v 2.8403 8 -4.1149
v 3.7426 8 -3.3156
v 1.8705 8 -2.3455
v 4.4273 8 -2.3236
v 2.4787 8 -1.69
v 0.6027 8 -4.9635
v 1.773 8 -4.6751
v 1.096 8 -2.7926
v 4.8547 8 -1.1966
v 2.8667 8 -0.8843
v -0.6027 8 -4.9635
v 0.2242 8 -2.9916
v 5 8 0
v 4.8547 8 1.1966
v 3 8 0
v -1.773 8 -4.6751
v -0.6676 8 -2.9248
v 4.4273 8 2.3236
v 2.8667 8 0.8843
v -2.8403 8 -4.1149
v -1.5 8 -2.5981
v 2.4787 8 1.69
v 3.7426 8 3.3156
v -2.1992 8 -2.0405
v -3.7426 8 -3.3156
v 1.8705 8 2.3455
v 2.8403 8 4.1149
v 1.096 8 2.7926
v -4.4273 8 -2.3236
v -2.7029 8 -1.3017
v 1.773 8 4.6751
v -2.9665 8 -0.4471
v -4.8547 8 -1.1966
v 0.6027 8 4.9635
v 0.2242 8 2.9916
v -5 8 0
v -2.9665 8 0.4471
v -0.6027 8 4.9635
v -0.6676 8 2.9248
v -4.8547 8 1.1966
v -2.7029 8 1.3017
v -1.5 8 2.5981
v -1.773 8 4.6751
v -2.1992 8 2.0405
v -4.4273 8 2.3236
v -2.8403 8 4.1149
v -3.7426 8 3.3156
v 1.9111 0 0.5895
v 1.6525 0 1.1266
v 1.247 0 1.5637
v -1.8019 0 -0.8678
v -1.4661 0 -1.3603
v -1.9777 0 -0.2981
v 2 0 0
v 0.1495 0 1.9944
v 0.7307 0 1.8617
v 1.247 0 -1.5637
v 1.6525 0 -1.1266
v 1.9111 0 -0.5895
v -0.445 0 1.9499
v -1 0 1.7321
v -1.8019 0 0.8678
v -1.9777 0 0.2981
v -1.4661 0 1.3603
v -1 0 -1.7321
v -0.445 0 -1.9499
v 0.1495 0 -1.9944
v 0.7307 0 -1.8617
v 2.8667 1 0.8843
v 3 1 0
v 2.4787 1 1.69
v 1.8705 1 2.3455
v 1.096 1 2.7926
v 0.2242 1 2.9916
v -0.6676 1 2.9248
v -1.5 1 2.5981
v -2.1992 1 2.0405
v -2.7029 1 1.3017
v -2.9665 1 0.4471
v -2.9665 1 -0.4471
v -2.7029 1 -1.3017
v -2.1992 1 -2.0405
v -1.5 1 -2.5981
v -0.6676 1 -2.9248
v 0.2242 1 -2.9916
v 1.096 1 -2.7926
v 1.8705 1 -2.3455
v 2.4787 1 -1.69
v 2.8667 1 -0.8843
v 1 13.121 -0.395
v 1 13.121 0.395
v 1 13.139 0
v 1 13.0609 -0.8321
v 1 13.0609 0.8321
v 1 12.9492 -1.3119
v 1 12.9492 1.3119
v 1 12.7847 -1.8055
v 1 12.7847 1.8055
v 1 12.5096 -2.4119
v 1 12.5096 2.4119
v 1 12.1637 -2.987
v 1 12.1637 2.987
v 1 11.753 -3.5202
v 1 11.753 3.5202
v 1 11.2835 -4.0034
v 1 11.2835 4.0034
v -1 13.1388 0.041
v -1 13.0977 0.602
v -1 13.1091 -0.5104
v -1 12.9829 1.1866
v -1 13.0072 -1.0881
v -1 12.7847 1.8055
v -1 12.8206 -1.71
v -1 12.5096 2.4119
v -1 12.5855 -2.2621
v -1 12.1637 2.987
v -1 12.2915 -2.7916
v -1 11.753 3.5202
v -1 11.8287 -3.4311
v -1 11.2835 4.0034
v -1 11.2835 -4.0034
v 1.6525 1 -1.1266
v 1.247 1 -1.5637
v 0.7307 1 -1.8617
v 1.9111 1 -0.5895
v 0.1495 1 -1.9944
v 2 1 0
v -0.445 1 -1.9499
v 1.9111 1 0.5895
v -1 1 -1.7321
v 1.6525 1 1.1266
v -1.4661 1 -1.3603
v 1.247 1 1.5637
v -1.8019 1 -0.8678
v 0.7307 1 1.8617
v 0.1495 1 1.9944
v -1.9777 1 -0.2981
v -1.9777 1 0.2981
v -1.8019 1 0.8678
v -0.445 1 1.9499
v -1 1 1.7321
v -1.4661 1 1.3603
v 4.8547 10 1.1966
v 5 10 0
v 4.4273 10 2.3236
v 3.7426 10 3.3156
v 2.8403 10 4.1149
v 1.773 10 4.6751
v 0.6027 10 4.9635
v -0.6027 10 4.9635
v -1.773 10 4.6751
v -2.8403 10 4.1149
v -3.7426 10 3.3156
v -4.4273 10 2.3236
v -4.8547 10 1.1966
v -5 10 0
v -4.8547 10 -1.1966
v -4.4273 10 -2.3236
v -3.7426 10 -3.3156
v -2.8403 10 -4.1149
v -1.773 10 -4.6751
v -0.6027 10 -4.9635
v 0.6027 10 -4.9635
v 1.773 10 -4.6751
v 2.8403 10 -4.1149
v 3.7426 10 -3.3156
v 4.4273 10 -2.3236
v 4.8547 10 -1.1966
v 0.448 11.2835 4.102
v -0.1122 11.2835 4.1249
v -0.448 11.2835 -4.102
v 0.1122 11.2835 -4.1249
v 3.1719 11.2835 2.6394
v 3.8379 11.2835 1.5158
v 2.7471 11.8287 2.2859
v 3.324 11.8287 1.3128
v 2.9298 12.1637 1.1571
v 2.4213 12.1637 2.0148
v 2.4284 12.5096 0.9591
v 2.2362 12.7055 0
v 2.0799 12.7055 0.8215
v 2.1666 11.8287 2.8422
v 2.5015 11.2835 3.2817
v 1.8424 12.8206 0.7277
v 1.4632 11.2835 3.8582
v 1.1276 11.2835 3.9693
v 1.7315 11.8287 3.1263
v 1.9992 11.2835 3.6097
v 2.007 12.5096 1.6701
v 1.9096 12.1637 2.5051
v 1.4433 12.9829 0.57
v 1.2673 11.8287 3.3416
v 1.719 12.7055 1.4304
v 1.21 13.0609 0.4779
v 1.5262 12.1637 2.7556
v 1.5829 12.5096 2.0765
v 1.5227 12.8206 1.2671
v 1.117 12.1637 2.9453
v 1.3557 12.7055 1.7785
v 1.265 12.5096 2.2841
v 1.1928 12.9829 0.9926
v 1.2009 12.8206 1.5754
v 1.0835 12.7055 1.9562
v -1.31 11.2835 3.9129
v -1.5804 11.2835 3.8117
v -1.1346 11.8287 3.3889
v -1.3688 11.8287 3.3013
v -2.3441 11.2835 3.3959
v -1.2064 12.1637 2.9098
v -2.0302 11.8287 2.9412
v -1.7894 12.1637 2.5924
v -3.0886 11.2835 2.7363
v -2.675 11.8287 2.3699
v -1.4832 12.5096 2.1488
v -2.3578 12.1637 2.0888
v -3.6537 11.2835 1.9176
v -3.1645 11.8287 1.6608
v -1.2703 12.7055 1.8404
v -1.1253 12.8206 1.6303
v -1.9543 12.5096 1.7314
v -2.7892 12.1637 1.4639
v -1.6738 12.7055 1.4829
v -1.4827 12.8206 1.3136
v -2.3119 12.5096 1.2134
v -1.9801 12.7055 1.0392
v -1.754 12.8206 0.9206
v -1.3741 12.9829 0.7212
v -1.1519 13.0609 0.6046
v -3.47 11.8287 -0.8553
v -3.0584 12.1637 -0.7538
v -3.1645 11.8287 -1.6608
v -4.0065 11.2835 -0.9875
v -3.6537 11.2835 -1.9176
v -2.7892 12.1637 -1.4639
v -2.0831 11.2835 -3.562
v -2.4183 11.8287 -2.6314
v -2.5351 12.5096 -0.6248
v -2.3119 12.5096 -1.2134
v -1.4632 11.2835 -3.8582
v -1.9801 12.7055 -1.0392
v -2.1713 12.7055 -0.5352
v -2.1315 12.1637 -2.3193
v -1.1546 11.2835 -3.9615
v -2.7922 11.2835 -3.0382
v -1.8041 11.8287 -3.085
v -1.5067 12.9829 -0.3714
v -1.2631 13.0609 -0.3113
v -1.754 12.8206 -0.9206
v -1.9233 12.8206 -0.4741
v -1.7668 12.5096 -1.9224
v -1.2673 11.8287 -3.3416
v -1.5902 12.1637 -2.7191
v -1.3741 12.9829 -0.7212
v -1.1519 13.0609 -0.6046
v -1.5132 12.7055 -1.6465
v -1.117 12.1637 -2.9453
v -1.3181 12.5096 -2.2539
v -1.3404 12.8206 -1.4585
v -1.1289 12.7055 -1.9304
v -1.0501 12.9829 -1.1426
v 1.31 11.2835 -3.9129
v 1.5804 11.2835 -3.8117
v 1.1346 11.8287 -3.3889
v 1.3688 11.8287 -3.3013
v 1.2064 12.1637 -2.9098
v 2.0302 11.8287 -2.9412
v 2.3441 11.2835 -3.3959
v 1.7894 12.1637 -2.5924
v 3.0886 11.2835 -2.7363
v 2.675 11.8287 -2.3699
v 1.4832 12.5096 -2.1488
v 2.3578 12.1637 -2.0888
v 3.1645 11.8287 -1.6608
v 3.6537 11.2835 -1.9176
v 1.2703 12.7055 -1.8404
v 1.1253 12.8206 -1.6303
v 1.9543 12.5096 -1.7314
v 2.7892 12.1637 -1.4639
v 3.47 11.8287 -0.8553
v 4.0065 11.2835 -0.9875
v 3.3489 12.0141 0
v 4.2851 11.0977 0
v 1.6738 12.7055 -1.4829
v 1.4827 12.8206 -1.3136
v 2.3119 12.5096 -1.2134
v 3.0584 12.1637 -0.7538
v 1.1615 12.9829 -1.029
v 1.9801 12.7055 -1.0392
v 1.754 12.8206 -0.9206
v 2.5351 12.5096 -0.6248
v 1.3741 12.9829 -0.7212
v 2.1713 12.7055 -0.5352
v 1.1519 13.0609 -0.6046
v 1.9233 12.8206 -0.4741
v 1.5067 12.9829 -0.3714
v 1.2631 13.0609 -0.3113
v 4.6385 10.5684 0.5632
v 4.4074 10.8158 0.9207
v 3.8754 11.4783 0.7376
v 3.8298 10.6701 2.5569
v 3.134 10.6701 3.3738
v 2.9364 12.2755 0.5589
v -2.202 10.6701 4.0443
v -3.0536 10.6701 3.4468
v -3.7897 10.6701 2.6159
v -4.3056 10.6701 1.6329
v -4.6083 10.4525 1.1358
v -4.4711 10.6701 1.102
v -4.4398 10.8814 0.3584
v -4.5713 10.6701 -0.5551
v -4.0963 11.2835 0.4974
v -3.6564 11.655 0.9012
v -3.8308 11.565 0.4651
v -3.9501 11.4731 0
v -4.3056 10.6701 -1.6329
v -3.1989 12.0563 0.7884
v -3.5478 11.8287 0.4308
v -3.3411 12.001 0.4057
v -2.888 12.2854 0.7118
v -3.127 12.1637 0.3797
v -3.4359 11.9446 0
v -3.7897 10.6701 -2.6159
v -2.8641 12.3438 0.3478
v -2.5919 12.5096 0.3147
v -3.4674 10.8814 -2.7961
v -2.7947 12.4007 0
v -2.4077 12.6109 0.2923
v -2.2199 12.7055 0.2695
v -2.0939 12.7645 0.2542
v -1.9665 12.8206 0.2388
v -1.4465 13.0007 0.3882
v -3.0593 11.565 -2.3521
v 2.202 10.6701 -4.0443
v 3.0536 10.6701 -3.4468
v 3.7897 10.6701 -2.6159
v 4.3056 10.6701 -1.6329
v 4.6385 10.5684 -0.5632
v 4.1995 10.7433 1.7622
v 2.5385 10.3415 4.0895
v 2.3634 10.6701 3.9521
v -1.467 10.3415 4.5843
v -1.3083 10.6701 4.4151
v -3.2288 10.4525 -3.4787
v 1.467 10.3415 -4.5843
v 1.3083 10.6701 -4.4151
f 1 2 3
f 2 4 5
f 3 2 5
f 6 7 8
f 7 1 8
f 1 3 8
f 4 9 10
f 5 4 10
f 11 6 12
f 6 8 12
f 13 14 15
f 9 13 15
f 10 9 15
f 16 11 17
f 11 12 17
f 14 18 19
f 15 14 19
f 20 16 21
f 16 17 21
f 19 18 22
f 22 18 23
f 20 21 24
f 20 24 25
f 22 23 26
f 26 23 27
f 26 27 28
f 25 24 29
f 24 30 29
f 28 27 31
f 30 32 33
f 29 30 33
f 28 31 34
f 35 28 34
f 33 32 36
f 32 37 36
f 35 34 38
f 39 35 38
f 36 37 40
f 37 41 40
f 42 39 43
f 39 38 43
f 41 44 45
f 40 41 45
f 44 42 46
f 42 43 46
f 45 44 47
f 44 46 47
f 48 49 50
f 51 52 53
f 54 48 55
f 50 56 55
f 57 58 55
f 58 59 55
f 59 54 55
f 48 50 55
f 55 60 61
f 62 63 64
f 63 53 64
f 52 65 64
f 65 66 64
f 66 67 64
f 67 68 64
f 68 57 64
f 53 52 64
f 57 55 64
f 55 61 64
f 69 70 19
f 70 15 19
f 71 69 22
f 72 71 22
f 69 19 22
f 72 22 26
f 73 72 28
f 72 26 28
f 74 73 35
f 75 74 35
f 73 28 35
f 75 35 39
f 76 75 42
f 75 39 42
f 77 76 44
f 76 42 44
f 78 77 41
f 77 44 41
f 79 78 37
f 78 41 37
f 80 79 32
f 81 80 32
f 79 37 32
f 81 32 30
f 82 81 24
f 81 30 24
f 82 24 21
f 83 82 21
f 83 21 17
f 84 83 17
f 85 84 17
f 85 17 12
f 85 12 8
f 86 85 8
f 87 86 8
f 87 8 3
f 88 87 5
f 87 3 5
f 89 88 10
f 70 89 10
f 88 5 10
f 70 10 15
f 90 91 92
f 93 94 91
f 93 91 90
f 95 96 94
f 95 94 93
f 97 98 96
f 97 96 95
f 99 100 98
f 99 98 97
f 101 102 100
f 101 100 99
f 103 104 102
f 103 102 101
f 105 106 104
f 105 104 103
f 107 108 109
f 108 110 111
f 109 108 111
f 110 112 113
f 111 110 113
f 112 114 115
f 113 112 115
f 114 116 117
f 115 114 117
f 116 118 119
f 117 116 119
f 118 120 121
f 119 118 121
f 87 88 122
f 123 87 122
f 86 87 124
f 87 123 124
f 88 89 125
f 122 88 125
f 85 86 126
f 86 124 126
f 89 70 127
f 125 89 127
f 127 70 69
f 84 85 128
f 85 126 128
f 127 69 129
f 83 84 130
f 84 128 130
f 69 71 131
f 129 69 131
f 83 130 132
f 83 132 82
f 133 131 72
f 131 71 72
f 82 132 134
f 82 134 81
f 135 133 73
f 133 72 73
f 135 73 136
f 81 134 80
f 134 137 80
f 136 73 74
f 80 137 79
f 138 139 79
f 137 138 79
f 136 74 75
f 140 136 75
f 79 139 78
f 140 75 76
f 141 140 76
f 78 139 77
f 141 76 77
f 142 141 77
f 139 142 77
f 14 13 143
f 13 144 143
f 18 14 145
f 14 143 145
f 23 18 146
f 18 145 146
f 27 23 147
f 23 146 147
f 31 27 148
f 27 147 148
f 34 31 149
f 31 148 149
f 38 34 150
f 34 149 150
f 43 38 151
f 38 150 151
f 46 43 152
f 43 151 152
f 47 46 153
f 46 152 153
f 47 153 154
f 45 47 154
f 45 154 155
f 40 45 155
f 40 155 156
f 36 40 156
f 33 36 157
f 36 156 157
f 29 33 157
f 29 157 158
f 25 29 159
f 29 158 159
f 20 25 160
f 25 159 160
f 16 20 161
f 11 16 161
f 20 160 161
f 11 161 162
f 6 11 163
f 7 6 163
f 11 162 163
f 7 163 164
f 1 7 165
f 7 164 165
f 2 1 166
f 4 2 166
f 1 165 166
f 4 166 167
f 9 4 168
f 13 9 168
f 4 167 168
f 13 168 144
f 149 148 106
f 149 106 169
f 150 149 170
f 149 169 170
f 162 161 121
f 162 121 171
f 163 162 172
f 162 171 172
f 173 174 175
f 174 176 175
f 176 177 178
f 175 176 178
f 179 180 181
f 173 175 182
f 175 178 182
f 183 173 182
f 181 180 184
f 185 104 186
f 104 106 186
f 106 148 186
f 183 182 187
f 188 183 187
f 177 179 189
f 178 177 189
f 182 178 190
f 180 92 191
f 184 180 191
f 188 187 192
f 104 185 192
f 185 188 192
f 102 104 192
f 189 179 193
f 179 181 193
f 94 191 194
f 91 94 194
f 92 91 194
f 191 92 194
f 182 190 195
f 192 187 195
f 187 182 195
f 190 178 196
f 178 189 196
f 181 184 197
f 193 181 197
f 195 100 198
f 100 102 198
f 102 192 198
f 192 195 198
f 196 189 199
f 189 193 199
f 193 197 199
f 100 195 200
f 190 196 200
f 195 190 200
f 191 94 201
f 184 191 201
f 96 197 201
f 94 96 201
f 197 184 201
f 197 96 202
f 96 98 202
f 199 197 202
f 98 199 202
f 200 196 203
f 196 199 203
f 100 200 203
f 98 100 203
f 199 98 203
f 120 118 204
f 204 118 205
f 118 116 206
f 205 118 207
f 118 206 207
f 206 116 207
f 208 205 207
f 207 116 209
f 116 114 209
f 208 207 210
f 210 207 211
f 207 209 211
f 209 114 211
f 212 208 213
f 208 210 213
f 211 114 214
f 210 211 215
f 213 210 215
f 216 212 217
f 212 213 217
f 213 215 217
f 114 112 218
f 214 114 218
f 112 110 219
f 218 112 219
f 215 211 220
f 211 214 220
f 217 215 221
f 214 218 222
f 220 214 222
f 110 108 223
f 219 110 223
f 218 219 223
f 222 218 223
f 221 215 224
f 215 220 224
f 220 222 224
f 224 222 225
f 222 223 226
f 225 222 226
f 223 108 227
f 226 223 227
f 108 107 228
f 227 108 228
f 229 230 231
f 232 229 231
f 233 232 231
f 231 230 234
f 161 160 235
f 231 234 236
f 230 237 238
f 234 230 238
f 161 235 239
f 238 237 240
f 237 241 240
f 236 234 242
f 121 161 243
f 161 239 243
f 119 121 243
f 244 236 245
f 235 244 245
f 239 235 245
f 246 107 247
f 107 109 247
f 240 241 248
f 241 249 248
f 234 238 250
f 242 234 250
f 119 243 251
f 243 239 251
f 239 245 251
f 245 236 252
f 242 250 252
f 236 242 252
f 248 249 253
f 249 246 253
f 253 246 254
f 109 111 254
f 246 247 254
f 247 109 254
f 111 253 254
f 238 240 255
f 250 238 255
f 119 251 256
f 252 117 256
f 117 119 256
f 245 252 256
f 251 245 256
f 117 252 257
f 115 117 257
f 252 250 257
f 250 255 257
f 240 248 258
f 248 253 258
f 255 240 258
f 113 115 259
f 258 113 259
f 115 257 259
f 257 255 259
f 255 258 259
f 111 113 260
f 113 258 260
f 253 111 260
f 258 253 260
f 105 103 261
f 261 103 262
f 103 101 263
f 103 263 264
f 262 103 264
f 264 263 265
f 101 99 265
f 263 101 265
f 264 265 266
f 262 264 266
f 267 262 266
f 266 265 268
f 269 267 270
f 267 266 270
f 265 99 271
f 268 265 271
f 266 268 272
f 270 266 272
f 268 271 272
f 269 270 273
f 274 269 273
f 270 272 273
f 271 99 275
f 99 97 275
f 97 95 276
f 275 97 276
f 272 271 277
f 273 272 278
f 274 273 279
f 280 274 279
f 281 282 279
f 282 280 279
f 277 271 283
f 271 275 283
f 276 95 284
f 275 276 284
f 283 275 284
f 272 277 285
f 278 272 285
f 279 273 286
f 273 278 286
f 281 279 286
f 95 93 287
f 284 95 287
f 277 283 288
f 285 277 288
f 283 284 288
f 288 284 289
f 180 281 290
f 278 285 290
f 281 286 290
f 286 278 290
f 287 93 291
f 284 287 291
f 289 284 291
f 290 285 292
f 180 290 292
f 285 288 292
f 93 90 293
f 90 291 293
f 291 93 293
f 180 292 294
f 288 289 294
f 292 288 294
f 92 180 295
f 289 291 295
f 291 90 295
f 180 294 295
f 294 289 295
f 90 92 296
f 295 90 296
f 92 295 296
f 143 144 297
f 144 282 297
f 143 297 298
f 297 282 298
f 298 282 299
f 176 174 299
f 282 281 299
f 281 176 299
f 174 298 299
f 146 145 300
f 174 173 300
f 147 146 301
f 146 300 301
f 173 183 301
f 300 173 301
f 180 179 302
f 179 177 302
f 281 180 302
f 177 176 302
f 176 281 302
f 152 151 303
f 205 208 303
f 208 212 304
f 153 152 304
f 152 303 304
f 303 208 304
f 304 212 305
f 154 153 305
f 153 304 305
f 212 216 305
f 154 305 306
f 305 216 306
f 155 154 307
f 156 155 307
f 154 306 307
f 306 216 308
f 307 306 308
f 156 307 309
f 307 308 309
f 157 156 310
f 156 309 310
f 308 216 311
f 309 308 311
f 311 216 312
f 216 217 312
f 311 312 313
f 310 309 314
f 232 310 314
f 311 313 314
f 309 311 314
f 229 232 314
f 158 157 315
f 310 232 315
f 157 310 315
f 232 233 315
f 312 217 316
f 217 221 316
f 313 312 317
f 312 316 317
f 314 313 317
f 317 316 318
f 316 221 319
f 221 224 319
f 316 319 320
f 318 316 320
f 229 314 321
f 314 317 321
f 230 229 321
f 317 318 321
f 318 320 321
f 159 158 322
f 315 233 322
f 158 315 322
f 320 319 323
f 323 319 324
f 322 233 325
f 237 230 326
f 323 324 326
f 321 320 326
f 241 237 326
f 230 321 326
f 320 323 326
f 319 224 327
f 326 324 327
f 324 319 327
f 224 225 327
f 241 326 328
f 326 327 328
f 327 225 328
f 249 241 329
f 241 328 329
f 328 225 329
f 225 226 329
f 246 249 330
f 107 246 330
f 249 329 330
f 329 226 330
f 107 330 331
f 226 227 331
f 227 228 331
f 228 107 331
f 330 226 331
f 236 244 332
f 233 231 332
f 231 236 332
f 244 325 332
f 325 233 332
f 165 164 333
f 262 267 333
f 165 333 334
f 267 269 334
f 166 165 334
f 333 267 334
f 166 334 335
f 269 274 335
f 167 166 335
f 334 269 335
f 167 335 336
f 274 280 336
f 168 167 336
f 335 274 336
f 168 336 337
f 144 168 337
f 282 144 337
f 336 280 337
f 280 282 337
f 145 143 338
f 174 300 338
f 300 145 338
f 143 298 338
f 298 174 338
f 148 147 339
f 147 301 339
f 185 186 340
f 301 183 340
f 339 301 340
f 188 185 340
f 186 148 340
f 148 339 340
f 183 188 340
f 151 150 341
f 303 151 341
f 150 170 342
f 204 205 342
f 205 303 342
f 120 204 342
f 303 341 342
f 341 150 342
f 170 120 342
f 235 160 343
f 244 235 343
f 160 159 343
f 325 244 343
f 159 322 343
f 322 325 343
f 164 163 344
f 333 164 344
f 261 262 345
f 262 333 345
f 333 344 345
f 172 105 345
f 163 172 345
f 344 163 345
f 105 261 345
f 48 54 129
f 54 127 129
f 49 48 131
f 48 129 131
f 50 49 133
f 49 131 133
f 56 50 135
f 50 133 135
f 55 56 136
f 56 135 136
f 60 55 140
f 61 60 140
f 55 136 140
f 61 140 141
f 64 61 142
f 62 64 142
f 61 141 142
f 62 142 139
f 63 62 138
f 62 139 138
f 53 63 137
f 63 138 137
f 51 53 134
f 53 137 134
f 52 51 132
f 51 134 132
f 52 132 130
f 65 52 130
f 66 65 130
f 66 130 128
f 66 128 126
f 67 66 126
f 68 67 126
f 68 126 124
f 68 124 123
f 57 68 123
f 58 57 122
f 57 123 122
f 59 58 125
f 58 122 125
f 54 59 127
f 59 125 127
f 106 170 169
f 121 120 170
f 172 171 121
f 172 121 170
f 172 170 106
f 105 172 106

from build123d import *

# Parameters (mm, degrees)
SKETCH2_W               = 2
SKETCH2_H               = 4
CUT_EXTRUDE1_DEPTH      = 6.0000001
CUT_EXTRUDE1_DEPTH_BACK = 6.0000001


with BuildPart() as part:
    # Sketch1 → Revolve1 (revolve)
    with BuildSketch(Plane.XY):
        with BuildLine():
            Line((0, 0), (2, 0))
            Line((2, 0), (2, 1))
            Line((2, 1), (3, 1))
            Line((3, 1), (3, 8))
            Line((3, 8), (5, 8))
            Line((5, 8), (5, 10))
            ThreePointArc((5, 10), (2.938358294, 12.309260763), (0, 13.283479594))
            Line((0, 13.283479594), (0, 0))
        make_face()
    revolve(axis=Axis((0, 13.283479594, 0), (0, -1, 0)))

    # Sketch2 → Cut-Extrude1 (cut, two sides)
    with BuildSketch(Plane.XY) as cut_extrude1_sk:
        with Locations((0, 13.283479594)):
            Rectangle(SKETCH2_W, SKETCH2_H)
    extrude(amount=CUT_EXTRUDE1_DEPTH, mode=Mode.SUBTRACT)
    extrude(cut_extrude1_sk.sketch, amount=-CUT_EXTRUDE1_DEPTH_BACK, mode=Mode.SUBTRACT)


solid = part.part
